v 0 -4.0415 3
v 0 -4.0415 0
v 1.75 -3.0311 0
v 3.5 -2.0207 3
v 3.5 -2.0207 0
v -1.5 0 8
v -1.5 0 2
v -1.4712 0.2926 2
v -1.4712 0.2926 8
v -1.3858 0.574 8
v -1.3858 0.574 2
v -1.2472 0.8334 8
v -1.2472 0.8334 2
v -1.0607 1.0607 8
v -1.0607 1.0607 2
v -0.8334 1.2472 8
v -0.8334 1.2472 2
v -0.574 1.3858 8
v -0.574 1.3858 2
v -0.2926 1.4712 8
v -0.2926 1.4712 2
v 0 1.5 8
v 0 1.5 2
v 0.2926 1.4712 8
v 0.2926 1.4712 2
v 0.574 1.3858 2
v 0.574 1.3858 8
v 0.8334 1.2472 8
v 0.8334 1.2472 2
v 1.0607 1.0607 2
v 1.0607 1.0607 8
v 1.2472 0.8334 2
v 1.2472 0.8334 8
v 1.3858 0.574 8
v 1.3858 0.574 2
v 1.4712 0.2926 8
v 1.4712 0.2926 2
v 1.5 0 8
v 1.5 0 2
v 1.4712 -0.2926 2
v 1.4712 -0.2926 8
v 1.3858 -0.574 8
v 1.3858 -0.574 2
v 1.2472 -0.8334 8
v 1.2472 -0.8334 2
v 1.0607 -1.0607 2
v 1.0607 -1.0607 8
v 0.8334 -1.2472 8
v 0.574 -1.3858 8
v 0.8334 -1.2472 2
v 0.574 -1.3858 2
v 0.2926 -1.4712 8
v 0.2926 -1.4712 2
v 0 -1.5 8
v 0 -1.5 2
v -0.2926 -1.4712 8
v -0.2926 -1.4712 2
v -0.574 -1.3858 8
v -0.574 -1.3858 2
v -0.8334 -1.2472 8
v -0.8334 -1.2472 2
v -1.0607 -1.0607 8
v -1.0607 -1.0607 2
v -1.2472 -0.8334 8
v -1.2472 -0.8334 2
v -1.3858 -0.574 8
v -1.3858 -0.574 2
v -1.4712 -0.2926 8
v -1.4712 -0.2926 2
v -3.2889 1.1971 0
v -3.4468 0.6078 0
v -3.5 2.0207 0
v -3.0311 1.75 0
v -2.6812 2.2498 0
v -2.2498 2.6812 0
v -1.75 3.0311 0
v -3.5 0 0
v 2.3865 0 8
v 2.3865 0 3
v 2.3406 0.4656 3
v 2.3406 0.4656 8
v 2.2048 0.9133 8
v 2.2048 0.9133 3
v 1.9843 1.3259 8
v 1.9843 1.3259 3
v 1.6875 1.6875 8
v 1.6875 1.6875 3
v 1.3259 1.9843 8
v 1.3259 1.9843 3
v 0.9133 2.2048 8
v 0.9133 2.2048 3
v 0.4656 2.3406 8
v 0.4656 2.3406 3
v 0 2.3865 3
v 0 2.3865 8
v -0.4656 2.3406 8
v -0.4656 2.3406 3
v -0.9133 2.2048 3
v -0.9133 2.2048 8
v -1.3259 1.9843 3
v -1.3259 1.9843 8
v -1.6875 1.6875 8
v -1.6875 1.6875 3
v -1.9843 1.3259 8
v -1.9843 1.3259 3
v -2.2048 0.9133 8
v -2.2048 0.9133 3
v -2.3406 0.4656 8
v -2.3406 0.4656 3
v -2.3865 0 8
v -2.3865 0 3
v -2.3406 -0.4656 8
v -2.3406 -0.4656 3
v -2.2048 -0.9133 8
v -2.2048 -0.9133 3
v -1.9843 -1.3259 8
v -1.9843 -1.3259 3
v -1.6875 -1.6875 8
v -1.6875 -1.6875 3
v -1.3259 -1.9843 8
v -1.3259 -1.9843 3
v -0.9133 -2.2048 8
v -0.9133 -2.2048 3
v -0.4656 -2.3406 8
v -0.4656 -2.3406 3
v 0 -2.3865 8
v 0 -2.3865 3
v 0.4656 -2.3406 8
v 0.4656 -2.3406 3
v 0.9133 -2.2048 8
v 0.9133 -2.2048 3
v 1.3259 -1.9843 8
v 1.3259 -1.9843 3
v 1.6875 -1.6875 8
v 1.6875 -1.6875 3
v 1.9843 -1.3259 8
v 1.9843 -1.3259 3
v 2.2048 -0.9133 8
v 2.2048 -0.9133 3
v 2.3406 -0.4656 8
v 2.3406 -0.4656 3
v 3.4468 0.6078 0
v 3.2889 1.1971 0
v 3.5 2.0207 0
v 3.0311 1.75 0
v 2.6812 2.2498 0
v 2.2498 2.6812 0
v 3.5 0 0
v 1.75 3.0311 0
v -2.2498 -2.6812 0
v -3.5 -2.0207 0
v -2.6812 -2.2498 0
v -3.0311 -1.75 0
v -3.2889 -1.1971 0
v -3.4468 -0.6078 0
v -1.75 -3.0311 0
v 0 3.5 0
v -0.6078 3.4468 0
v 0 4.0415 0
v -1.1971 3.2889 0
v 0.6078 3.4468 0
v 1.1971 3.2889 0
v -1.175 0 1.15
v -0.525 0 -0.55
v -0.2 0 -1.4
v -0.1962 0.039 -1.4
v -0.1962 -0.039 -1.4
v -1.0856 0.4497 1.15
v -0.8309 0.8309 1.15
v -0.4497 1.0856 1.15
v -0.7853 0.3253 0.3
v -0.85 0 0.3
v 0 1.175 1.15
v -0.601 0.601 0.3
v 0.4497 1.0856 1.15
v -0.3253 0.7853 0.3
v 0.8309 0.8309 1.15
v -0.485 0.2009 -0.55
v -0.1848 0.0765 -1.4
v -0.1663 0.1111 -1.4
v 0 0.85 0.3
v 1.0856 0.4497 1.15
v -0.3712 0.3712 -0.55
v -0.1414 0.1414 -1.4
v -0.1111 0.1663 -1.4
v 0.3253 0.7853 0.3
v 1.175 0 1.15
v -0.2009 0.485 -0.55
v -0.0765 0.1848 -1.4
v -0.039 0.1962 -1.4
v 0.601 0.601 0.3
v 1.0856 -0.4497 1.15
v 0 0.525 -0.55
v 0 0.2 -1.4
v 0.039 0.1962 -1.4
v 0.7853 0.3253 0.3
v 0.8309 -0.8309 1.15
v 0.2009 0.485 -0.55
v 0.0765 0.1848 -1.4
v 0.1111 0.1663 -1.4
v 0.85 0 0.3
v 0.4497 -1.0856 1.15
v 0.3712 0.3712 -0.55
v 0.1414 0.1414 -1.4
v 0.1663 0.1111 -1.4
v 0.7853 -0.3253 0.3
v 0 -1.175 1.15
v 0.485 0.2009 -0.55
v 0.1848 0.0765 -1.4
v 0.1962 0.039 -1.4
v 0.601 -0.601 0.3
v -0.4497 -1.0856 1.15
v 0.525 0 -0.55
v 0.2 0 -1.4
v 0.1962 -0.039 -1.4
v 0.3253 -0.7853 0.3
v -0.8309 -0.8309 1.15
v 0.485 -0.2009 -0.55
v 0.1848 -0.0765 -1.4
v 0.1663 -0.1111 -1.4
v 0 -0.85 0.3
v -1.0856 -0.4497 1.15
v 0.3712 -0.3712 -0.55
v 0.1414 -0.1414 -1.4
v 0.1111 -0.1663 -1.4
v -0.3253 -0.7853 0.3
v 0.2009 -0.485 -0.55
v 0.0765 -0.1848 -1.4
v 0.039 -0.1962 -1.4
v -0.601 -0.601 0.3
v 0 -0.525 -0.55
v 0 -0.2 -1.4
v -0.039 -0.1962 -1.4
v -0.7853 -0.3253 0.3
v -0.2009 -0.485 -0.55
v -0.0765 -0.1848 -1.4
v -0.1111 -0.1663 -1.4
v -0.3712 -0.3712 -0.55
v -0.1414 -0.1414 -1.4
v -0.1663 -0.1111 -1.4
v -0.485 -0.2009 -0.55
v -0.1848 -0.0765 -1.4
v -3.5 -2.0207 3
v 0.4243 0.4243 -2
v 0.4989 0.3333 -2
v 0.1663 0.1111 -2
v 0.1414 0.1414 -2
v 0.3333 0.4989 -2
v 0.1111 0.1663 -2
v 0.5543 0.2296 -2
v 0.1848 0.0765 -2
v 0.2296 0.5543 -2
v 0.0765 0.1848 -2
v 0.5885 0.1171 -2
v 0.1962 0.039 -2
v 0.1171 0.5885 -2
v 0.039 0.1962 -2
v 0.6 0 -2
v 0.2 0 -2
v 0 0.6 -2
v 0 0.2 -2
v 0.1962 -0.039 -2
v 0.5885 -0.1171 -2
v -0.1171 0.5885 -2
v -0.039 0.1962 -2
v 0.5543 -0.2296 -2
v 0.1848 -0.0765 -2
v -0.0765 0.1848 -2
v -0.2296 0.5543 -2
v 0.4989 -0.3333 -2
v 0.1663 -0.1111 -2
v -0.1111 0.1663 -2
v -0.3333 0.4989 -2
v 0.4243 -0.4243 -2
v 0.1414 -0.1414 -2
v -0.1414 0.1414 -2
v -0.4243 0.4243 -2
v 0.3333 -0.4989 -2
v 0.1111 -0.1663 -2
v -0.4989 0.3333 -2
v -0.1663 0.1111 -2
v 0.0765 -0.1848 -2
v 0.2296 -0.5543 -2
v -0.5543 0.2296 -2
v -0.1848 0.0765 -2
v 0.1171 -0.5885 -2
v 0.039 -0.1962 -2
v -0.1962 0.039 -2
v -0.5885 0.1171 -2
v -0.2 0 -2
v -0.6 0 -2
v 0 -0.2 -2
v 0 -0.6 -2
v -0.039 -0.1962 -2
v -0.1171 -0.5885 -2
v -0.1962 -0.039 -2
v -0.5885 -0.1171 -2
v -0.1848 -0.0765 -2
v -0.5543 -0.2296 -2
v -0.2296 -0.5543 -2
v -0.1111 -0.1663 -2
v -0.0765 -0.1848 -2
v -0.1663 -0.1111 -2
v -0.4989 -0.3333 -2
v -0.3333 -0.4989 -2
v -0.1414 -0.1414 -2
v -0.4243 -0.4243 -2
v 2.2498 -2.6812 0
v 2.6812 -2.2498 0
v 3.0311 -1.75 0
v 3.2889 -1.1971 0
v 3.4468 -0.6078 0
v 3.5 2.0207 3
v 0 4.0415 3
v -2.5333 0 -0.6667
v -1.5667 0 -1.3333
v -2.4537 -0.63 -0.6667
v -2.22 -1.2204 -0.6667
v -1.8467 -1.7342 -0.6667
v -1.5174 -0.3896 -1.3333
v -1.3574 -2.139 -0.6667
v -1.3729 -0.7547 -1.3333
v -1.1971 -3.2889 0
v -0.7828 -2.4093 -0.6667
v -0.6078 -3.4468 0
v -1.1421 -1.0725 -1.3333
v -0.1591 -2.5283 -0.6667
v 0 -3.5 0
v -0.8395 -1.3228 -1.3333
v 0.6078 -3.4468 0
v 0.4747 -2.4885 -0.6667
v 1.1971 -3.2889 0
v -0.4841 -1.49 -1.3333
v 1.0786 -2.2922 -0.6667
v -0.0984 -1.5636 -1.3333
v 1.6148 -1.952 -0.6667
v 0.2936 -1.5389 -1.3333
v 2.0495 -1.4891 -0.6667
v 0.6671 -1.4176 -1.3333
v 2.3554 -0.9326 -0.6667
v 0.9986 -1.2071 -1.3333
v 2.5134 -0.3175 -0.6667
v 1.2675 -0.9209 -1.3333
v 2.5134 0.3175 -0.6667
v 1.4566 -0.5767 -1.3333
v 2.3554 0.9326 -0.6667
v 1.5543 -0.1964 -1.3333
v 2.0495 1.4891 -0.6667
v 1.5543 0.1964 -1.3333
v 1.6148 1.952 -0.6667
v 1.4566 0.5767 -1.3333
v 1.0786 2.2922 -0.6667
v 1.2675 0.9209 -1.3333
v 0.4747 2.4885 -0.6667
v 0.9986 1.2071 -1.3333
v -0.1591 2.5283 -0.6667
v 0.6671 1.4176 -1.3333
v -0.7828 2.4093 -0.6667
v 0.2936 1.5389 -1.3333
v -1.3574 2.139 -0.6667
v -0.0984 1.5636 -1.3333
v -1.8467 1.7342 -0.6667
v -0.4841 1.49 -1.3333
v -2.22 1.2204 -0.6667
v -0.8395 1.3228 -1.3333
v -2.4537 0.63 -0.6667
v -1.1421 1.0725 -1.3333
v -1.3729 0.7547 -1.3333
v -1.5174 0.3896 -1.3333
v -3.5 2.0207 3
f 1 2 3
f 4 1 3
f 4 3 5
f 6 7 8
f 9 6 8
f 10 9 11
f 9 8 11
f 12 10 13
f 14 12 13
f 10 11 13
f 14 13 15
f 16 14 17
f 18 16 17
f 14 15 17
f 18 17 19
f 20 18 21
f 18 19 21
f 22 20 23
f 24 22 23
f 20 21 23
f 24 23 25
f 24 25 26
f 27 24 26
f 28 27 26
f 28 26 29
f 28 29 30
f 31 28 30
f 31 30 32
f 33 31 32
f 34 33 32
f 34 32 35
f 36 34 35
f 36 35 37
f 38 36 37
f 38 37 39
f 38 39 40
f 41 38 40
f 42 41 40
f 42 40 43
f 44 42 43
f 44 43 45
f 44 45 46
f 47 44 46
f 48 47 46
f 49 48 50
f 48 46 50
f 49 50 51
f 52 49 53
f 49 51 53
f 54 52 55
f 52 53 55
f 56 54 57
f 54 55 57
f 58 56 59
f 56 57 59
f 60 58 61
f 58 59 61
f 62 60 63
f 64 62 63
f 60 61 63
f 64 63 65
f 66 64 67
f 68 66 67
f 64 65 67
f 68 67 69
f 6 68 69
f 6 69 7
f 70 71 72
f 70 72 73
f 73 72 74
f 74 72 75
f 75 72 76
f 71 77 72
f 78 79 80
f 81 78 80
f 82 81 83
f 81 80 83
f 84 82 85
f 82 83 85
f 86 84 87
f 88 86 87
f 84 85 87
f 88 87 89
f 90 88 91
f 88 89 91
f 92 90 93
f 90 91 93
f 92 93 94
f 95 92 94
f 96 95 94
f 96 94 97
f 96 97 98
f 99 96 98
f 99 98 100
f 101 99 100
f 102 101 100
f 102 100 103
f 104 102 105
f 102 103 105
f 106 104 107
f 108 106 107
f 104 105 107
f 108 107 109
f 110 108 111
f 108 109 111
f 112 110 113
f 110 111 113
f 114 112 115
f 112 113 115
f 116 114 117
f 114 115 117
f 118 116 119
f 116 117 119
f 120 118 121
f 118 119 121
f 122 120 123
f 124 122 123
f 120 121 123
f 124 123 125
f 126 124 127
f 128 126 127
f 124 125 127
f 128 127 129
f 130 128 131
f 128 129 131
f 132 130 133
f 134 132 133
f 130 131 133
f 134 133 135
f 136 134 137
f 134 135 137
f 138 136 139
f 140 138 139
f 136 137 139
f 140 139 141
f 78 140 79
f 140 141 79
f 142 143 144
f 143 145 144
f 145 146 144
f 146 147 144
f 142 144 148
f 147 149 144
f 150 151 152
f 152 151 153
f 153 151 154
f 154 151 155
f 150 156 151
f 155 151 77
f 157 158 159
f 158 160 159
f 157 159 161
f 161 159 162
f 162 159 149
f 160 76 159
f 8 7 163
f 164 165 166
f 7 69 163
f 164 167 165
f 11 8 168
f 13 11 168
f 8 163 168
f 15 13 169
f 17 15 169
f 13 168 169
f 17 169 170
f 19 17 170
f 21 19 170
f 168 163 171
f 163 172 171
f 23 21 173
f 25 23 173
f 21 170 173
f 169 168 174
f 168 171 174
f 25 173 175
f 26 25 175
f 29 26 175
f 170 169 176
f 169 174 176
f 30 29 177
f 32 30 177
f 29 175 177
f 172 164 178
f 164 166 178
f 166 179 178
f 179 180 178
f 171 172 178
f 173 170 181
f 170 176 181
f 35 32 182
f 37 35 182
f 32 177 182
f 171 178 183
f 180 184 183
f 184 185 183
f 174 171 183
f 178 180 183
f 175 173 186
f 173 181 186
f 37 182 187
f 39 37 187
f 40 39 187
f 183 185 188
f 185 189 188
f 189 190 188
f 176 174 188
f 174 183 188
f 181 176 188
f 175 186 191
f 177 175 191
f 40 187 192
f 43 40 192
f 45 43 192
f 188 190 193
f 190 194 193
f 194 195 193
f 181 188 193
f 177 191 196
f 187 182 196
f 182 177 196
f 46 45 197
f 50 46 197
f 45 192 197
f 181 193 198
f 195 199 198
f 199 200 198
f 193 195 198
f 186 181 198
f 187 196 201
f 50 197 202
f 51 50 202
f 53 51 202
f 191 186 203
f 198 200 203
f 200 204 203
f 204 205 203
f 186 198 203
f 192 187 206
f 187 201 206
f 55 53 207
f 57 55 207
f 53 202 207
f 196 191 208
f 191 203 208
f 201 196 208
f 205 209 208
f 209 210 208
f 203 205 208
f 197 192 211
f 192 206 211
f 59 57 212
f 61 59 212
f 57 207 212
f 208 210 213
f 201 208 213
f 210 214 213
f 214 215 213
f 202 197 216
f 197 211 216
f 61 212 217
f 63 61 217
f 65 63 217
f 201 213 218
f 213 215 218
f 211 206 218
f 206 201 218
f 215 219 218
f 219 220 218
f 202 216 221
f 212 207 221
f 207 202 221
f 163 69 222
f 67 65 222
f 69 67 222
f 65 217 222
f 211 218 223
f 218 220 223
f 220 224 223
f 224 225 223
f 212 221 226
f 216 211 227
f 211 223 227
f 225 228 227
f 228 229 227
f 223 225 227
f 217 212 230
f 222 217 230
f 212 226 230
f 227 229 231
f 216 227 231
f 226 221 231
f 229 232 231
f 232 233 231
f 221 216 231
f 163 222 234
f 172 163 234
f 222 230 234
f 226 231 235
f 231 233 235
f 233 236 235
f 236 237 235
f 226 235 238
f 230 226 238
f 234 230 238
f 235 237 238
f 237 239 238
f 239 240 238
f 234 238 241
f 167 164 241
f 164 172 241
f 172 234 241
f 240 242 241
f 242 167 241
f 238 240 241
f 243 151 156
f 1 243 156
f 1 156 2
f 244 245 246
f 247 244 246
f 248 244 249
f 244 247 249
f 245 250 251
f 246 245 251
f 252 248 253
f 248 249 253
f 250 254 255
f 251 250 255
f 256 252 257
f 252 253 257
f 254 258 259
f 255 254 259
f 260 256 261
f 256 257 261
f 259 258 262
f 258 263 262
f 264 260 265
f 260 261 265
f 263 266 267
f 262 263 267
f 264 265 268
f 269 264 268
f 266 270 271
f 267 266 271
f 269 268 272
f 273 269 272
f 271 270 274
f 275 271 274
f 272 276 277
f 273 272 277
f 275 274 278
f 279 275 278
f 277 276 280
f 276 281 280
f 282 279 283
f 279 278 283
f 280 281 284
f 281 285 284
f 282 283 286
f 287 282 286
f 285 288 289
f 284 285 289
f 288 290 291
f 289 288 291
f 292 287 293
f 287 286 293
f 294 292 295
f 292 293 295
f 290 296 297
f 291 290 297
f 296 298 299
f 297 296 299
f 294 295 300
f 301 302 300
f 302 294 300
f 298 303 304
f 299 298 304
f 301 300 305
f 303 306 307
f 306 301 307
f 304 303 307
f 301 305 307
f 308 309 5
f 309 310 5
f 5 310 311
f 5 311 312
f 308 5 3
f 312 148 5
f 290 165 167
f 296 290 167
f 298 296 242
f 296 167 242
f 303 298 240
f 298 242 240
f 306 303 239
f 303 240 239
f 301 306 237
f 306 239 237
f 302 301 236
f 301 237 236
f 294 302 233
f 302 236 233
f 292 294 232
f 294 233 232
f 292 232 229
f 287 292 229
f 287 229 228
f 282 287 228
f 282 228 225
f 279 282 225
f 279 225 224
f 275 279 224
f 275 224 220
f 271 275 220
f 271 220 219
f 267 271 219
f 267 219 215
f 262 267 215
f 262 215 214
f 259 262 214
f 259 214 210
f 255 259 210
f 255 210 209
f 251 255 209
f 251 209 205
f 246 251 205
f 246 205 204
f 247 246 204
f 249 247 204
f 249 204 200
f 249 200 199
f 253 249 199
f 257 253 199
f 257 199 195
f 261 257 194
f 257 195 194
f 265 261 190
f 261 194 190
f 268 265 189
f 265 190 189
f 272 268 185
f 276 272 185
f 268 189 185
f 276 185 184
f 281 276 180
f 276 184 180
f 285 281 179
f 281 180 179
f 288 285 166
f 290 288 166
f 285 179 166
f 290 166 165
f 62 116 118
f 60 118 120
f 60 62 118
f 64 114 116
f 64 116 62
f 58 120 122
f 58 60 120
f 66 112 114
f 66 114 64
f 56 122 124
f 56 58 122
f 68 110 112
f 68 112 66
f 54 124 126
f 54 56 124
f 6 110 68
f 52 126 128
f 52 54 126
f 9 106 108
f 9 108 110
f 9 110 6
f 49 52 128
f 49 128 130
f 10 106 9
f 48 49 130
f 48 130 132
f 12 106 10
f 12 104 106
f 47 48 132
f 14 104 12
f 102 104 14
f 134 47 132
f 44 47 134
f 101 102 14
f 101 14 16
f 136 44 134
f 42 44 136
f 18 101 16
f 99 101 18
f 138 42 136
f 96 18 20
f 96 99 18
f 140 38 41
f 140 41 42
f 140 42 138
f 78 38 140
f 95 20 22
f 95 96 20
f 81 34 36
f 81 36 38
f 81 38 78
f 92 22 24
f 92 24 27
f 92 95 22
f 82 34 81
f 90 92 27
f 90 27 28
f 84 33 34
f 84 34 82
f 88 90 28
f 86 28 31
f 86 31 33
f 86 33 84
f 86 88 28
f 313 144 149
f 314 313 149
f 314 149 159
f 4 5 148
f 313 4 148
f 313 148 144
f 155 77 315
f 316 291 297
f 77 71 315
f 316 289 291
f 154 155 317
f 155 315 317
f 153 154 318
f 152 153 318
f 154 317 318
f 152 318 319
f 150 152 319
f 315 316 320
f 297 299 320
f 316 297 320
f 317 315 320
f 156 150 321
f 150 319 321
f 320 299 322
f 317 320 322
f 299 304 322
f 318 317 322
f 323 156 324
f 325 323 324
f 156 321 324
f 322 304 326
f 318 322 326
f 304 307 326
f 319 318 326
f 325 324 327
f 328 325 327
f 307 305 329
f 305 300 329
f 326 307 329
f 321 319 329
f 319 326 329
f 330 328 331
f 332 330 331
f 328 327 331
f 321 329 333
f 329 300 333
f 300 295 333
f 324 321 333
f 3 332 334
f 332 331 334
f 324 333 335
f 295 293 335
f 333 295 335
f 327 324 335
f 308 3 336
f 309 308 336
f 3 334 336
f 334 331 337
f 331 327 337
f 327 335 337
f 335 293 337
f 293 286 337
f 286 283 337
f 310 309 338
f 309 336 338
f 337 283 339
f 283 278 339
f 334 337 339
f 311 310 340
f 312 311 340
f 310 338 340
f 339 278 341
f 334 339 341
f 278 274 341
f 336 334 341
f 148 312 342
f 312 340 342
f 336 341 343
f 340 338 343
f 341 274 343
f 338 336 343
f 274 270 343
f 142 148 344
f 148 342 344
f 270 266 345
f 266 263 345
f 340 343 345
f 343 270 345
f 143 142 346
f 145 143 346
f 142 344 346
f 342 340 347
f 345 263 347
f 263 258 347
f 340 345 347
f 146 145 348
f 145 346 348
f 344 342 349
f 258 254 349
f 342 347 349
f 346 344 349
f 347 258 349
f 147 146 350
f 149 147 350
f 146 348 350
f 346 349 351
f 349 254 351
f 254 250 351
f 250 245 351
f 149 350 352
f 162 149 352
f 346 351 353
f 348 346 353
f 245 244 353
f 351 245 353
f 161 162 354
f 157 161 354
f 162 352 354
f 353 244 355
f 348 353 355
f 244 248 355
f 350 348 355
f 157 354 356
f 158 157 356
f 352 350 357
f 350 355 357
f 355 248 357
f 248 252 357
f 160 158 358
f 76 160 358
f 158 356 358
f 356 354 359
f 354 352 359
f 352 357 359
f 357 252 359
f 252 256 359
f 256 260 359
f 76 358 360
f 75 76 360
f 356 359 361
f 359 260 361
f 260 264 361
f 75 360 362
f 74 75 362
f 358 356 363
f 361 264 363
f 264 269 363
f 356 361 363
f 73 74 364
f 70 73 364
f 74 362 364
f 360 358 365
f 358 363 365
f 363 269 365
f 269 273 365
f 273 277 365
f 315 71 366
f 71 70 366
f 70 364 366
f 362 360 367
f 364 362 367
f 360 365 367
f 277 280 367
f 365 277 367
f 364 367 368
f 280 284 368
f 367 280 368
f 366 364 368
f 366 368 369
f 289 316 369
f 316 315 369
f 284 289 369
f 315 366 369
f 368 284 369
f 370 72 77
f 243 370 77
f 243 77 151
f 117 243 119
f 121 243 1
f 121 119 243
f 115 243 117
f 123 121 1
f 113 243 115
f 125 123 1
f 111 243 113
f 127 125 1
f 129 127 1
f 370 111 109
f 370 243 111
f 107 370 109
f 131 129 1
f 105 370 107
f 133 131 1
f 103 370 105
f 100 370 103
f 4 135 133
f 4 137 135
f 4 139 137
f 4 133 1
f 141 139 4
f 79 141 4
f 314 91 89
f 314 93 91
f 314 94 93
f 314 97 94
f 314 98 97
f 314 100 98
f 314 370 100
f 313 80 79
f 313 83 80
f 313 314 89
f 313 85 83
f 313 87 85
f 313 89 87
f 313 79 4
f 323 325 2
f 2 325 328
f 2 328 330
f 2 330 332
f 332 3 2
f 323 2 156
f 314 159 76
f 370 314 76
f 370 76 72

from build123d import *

# Parameters (mm, degrees)
F2_DEPTH  = 3
F3_R      = 2.3865
F4_DEPTH  = 5
F8_D      = 3
F8_DEPTH  = 6
F10_D     = 0.4
F10_DEPTH = 6


with BuildPart() as f2:
    # F1 (on Top) → F2 (new body)
    with BuildSketch(Plane.XY):
        Polygon((3.5, -2.020726), (3.5, 2.020726), (0, 4.041452), (-3.5, 2.020726), (-3.5, -2.020726), (0, -4.041452), align=None)
    extrude(amount=F2_DEPTH)

    # F3 (on face) → F4 (join)
    with BuildSketch(Plane.XY.offset(3)):
        Circle(F3_R)
    extrude(amount=F4_DEPTH)

    # F5 (on Front) → F6 (revolve)
    with BuildSketch(Plane.XZ):
        Polygon((0, -2), (0, 0), (-3.5, 0), (-0.6, -2), align=None)
    revolve(axis=Axis((0, 0, -1), (0, 0, 1)))

    # F8
    with Locations(Plane.XY.offset(8)):
        with Locations((0, 0)):
            Hole(F8_D / 2, depth=F8_DEPTH)

    # F10
    with Locations(Plane(origin=(0, 0, -2), x_dir=(1, 0, 0), z_dir=(0, 0, -1))):
        with Locations((0, 0)):
            Hole(F10_D / 2, depth=F10_DEPTH)

    # F11 (on Front) → F12 (revolve, cut)
    with BuildSketch(Plane.XZ):
        Polygon((0, 2), (-1.5, 2), (-0.2, -1.4), (0, -1.4), align=None)
    revolve(axis=Axis((0, 0, 0.3), (0, 0, -1)), mode=Mode.SUBTRACT)


solid = f2.part
